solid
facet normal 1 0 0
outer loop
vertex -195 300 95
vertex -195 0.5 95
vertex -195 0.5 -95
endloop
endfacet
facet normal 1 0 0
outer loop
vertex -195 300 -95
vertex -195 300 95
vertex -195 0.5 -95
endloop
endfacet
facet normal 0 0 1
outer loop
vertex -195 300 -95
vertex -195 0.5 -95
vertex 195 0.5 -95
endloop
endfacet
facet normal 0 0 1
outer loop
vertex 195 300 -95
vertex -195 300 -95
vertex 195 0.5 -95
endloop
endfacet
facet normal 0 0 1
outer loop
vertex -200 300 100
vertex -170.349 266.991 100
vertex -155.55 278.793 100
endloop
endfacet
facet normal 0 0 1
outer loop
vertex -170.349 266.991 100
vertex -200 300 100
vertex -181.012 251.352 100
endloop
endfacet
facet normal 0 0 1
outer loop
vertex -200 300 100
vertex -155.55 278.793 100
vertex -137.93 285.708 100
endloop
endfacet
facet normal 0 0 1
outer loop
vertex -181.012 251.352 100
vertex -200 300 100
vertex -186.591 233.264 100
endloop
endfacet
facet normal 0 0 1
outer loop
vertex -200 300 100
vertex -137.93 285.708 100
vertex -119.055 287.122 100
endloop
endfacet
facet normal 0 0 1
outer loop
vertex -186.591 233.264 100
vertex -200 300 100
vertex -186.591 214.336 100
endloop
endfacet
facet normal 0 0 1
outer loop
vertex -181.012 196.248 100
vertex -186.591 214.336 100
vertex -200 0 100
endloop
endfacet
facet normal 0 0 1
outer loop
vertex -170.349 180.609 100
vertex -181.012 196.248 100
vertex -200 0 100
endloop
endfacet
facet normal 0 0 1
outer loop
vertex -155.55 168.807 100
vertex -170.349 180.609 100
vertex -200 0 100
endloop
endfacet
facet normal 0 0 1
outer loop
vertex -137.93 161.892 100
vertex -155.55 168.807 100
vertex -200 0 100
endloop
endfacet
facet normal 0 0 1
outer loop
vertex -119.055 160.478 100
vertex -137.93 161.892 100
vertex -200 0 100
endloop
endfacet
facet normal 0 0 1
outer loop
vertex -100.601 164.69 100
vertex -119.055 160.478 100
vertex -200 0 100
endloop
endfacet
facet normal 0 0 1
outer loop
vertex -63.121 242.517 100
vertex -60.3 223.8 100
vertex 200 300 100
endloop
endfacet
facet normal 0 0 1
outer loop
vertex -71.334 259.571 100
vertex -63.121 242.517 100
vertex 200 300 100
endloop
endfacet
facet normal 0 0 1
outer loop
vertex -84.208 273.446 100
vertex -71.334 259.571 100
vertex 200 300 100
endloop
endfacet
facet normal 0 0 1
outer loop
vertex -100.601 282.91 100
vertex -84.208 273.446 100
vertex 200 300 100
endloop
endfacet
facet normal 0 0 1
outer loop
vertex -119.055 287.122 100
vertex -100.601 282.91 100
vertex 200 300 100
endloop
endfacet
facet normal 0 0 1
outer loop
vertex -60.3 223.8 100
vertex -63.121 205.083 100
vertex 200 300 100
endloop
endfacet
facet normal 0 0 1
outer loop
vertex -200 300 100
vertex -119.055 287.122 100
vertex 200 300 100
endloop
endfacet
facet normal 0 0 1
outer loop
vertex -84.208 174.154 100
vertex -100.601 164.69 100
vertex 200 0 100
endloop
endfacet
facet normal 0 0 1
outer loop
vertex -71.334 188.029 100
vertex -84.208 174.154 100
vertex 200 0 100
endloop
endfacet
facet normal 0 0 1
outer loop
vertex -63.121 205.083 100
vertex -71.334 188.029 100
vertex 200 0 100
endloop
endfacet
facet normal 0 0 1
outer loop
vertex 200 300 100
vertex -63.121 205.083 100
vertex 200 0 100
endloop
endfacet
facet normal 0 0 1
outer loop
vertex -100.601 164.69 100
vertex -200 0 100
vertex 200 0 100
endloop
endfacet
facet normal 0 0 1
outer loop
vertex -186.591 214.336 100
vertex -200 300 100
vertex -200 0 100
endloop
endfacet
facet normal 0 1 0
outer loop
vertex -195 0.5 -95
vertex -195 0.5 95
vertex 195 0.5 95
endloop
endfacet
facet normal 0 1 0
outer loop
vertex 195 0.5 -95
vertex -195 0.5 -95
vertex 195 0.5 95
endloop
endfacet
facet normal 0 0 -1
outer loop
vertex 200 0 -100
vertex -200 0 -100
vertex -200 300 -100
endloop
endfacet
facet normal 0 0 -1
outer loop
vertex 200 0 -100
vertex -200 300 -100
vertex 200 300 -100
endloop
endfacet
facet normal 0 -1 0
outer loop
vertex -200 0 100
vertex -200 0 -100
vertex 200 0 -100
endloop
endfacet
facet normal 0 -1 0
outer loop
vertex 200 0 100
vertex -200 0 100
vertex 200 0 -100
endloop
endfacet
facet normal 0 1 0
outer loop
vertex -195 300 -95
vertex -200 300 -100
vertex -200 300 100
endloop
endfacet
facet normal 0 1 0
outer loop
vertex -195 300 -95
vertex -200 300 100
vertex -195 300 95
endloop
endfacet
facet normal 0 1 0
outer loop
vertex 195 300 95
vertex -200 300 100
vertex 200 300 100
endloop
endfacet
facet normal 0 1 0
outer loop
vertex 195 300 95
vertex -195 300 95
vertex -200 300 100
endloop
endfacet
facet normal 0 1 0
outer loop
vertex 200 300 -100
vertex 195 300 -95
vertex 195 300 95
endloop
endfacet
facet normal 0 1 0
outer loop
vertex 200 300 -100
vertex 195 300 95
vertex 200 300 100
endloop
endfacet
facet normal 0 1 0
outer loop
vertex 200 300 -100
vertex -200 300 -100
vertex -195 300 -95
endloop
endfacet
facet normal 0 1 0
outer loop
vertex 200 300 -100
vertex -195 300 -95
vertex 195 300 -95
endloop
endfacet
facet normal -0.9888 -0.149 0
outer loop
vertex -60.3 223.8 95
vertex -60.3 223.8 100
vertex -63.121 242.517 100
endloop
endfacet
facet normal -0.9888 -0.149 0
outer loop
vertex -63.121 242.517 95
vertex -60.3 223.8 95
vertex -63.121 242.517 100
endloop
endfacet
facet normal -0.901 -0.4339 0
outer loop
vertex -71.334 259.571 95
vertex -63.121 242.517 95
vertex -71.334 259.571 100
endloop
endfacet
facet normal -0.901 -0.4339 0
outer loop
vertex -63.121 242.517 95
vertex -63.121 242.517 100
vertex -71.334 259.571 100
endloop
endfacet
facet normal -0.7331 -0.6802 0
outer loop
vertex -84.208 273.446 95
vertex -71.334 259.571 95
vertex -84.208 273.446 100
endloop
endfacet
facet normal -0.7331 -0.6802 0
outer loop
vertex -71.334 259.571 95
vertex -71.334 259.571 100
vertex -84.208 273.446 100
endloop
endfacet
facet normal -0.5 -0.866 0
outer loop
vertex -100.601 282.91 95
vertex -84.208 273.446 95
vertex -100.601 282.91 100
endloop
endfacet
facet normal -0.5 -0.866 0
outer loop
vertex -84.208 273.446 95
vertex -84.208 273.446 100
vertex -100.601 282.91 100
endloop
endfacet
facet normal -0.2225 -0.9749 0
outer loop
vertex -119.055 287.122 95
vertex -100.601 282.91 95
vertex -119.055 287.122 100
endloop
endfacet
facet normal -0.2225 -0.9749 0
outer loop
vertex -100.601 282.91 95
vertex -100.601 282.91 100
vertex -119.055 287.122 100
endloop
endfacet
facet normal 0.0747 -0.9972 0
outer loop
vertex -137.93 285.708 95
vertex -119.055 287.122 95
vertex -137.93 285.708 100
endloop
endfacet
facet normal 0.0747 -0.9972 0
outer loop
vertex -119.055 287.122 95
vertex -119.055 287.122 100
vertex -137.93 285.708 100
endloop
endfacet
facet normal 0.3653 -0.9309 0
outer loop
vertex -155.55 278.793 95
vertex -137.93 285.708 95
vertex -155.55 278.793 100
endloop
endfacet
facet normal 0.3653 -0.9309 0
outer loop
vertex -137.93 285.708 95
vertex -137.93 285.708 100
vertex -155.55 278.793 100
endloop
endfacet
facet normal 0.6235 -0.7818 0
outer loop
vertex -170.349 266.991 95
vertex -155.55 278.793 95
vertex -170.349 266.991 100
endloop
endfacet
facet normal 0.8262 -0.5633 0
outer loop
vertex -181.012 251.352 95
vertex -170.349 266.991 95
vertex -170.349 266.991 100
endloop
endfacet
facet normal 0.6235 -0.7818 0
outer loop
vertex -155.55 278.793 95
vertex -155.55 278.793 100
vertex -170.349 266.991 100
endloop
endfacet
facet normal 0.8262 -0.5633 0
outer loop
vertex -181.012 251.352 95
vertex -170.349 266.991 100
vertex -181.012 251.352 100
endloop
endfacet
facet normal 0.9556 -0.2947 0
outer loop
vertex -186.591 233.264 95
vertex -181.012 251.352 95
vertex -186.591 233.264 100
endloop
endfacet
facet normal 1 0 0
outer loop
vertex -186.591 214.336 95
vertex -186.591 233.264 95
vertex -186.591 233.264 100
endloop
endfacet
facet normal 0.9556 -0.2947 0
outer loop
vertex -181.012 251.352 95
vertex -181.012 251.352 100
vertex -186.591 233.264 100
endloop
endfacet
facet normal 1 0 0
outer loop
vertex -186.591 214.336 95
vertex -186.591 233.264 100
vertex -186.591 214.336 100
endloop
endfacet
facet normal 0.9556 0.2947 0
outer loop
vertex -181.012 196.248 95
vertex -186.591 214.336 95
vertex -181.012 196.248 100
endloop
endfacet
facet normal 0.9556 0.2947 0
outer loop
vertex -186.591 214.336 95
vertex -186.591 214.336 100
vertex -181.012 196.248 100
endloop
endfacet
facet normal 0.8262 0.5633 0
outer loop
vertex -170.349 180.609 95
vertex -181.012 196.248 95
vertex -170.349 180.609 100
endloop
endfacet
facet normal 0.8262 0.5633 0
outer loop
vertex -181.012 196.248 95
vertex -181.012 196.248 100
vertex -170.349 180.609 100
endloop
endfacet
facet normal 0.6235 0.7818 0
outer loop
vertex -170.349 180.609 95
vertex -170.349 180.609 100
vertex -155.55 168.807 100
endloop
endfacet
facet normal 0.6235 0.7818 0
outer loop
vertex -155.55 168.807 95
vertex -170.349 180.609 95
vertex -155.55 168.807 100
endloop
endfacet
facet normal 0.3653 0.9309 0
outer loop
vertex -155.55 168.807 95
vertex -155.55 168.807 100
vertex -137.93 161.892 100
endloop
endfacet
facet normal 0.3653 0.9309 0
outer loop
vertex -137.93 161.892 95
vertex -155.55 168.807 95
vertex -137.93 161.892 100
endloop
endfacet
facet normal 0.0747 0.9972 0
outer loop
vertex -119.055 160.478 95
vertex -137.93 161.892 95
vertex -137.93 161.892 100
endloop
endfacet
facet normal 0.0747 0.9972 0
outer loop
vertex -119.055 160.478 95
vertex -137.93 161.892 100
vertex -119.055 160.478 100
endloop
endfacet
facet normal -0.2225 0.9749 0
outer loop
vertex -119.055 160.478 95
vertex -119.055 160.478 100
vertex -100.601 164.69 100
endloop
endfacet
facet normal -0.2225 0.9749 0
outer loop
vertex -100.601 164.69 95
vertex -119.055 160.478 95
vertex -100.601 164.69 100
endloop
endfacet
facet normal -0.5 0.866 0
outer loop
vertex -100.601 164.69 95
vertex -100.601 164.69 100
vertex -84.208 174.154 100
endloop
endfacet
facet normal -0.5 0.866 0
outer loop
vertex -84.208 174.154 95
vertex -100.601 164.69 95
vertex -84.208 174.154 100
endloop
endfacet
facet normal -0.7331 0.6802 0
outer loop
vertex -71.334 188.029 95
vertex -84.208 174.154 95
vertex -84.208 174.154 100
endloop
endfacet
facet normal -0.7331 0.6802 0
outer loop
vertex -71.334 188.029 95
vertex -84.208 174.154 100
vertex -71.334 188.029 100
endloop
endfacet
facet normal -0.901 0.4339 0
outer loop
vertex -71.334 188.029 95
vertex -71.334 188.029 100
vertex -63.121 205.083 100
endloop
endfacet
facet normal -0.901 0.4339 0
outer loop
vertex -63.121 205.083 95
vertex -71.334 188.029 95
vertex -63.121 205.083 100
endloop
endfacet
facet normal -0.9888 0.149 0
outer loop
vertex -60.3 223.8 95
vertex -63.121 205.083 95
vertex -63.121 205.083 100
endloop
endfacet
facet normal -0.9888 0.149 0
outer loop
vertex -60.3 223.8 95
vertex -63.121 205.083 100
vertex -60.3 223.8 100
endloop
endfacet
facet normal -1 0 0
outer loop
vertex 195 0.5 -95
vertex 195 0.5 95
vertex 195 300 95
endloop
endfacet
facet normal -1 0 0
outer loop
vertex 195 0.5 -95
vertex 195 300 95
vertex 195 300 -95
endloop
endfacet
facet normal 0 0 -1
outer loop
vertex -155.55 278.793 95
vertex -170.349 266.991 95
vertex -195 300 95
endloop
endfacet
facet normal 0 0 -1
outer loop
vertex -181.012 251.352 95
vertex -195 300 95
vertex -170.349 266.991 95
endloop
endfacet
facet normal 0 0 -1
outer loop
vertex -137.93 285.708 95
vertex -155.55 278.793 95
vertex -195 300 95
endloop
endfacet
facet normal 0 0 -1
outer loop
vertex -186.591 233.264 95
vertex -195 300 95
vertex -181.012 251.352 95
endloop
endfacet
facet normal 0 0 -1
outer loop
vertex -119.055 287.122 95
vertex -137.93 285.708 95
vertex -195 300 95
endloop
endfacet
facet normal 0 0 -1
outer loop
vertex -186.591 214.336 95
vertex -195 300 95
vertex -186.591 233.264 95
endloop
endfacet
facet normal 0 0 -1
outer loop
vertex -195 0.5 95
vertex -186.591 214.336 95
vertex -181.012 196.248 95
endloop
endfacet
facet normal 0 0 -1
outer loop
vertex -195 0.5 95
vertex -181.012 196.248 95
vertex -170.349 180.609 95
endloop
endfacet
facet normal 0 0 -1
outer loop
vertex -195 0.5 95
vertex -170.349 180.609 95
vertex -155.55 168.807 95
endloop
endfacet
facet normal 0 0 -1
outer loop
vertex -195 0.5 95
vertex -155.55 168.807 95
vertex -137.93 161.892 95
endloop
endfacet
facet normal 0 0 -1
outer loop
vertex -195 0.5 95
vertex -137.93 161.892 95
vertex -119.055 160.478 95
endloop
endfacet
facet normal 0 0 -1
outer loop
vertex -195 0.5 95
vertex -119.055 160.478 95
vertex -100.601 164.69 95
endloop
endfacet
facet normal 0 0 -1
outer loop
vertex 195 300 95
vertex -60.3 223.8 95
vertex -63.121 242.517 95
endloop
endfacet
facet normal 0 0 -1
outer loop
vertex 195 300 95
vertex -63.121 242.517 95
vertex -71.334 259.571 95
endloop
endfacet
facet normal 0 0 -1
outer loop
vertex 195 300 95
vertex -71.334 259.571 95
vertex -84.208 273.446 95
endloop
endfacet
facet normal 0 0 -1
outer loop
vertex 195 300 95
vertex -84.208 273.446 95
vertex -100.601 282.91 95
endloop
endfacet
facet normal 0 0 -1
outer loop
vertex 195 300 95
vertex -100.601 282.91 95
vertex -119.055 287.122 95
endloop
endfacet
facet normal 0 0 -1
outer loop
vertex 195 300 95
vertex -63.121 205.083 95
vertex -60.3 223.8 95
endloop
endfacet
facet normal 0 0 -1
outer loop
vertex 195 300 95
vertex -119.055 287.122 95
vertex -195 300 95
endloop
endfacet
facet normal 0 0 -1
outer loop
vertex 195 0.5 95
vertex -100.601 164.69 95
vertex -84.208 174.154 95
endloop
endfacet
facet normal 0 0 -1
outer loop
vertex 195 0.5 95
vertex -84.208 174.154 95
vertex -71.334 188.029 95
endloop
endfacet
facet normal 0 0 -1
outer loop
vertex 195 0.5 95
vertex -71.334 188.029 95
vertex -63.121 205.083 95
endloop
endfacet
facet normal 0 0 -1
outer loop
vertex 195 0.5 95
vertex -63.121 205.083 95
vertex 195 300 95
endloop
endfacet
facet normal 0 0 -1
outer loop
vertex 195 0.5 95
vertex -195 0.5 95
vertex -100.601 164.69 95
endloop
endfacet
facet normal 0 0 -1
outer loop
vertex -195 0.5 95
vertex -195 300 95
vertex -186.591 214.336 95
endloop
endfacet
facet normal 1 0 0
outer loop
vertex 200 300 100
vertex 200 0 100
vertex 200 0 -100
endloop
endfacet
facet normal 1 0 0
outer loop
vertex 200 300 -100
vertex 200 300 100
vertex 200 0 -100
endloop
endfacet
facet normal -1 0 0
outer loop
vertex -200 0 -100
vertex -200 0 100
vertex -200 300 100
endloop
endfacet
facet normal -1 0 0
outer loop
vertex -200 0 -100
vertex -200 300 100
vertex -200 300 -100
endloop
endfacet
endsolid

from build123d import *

# Parameters (mm, degrees)
SKETCH1_W           = 400
SKETCH1_H           = 200
SKETCH1_W_2         = 390
SKETCH1_H_2         = 190
BOSS_EXTRUDE1_DEPTH = 300
CUT_EXTRUDE1_REACH  = 414.311
SKETCH7_R           = 63.5
SKETCH8_W           = 400
SKETCH8_H           = 200
BOSS_EXTRUDE2_DEPTH = 0.5


with BuildPart() as part:
    # Sketch1 → Boss-Extrude1 (new body)
    with BuildSketch(Plane(origin=(0, 0, 0), x_dir=(1, 0, 0), z_dir=(0, 1, 0))):
        Rectangle(SKETCH1_W, SKETCH1_H)
        Rectangle(SKETCH1_W_2, SKETCH1_H_2, mode=Mode.SUBTRACT)
    extrude(amount=BOSS_EXTRUDE1_DEPTH)

    # Sketch7 → Cut-Extrude1 (cut, up to next)
    with BuildSketch(Plane.XY.offset(100), mode=Mode.PRIVATE) as cut_extrude1_sk1:
        with Locations((-123.8, 223.8)):
            Circle(SKETCH7_R)
    cut_extrude1_tool1 = extrude(cut_extrude1_sk1.sketch, amount=-CUT_EXTRUDE1_REACH, mode=Mode.PRIVATE) & part.part
    add(cut_extrude1_tool1.solids().sort_by_distance((-123.8, 223.8, 100))[0], mode=Mode.SUBTRACT)

    # Sketch8 → Boss-Extrude2 (add)
    with BuildSketch(Plane.XZ):
        Rectangle(SKETCH8_W, SKETCH8_H)
    extrude(amount=-BOSS_EXTRUDE2_DEPTH)


solid = part.part
